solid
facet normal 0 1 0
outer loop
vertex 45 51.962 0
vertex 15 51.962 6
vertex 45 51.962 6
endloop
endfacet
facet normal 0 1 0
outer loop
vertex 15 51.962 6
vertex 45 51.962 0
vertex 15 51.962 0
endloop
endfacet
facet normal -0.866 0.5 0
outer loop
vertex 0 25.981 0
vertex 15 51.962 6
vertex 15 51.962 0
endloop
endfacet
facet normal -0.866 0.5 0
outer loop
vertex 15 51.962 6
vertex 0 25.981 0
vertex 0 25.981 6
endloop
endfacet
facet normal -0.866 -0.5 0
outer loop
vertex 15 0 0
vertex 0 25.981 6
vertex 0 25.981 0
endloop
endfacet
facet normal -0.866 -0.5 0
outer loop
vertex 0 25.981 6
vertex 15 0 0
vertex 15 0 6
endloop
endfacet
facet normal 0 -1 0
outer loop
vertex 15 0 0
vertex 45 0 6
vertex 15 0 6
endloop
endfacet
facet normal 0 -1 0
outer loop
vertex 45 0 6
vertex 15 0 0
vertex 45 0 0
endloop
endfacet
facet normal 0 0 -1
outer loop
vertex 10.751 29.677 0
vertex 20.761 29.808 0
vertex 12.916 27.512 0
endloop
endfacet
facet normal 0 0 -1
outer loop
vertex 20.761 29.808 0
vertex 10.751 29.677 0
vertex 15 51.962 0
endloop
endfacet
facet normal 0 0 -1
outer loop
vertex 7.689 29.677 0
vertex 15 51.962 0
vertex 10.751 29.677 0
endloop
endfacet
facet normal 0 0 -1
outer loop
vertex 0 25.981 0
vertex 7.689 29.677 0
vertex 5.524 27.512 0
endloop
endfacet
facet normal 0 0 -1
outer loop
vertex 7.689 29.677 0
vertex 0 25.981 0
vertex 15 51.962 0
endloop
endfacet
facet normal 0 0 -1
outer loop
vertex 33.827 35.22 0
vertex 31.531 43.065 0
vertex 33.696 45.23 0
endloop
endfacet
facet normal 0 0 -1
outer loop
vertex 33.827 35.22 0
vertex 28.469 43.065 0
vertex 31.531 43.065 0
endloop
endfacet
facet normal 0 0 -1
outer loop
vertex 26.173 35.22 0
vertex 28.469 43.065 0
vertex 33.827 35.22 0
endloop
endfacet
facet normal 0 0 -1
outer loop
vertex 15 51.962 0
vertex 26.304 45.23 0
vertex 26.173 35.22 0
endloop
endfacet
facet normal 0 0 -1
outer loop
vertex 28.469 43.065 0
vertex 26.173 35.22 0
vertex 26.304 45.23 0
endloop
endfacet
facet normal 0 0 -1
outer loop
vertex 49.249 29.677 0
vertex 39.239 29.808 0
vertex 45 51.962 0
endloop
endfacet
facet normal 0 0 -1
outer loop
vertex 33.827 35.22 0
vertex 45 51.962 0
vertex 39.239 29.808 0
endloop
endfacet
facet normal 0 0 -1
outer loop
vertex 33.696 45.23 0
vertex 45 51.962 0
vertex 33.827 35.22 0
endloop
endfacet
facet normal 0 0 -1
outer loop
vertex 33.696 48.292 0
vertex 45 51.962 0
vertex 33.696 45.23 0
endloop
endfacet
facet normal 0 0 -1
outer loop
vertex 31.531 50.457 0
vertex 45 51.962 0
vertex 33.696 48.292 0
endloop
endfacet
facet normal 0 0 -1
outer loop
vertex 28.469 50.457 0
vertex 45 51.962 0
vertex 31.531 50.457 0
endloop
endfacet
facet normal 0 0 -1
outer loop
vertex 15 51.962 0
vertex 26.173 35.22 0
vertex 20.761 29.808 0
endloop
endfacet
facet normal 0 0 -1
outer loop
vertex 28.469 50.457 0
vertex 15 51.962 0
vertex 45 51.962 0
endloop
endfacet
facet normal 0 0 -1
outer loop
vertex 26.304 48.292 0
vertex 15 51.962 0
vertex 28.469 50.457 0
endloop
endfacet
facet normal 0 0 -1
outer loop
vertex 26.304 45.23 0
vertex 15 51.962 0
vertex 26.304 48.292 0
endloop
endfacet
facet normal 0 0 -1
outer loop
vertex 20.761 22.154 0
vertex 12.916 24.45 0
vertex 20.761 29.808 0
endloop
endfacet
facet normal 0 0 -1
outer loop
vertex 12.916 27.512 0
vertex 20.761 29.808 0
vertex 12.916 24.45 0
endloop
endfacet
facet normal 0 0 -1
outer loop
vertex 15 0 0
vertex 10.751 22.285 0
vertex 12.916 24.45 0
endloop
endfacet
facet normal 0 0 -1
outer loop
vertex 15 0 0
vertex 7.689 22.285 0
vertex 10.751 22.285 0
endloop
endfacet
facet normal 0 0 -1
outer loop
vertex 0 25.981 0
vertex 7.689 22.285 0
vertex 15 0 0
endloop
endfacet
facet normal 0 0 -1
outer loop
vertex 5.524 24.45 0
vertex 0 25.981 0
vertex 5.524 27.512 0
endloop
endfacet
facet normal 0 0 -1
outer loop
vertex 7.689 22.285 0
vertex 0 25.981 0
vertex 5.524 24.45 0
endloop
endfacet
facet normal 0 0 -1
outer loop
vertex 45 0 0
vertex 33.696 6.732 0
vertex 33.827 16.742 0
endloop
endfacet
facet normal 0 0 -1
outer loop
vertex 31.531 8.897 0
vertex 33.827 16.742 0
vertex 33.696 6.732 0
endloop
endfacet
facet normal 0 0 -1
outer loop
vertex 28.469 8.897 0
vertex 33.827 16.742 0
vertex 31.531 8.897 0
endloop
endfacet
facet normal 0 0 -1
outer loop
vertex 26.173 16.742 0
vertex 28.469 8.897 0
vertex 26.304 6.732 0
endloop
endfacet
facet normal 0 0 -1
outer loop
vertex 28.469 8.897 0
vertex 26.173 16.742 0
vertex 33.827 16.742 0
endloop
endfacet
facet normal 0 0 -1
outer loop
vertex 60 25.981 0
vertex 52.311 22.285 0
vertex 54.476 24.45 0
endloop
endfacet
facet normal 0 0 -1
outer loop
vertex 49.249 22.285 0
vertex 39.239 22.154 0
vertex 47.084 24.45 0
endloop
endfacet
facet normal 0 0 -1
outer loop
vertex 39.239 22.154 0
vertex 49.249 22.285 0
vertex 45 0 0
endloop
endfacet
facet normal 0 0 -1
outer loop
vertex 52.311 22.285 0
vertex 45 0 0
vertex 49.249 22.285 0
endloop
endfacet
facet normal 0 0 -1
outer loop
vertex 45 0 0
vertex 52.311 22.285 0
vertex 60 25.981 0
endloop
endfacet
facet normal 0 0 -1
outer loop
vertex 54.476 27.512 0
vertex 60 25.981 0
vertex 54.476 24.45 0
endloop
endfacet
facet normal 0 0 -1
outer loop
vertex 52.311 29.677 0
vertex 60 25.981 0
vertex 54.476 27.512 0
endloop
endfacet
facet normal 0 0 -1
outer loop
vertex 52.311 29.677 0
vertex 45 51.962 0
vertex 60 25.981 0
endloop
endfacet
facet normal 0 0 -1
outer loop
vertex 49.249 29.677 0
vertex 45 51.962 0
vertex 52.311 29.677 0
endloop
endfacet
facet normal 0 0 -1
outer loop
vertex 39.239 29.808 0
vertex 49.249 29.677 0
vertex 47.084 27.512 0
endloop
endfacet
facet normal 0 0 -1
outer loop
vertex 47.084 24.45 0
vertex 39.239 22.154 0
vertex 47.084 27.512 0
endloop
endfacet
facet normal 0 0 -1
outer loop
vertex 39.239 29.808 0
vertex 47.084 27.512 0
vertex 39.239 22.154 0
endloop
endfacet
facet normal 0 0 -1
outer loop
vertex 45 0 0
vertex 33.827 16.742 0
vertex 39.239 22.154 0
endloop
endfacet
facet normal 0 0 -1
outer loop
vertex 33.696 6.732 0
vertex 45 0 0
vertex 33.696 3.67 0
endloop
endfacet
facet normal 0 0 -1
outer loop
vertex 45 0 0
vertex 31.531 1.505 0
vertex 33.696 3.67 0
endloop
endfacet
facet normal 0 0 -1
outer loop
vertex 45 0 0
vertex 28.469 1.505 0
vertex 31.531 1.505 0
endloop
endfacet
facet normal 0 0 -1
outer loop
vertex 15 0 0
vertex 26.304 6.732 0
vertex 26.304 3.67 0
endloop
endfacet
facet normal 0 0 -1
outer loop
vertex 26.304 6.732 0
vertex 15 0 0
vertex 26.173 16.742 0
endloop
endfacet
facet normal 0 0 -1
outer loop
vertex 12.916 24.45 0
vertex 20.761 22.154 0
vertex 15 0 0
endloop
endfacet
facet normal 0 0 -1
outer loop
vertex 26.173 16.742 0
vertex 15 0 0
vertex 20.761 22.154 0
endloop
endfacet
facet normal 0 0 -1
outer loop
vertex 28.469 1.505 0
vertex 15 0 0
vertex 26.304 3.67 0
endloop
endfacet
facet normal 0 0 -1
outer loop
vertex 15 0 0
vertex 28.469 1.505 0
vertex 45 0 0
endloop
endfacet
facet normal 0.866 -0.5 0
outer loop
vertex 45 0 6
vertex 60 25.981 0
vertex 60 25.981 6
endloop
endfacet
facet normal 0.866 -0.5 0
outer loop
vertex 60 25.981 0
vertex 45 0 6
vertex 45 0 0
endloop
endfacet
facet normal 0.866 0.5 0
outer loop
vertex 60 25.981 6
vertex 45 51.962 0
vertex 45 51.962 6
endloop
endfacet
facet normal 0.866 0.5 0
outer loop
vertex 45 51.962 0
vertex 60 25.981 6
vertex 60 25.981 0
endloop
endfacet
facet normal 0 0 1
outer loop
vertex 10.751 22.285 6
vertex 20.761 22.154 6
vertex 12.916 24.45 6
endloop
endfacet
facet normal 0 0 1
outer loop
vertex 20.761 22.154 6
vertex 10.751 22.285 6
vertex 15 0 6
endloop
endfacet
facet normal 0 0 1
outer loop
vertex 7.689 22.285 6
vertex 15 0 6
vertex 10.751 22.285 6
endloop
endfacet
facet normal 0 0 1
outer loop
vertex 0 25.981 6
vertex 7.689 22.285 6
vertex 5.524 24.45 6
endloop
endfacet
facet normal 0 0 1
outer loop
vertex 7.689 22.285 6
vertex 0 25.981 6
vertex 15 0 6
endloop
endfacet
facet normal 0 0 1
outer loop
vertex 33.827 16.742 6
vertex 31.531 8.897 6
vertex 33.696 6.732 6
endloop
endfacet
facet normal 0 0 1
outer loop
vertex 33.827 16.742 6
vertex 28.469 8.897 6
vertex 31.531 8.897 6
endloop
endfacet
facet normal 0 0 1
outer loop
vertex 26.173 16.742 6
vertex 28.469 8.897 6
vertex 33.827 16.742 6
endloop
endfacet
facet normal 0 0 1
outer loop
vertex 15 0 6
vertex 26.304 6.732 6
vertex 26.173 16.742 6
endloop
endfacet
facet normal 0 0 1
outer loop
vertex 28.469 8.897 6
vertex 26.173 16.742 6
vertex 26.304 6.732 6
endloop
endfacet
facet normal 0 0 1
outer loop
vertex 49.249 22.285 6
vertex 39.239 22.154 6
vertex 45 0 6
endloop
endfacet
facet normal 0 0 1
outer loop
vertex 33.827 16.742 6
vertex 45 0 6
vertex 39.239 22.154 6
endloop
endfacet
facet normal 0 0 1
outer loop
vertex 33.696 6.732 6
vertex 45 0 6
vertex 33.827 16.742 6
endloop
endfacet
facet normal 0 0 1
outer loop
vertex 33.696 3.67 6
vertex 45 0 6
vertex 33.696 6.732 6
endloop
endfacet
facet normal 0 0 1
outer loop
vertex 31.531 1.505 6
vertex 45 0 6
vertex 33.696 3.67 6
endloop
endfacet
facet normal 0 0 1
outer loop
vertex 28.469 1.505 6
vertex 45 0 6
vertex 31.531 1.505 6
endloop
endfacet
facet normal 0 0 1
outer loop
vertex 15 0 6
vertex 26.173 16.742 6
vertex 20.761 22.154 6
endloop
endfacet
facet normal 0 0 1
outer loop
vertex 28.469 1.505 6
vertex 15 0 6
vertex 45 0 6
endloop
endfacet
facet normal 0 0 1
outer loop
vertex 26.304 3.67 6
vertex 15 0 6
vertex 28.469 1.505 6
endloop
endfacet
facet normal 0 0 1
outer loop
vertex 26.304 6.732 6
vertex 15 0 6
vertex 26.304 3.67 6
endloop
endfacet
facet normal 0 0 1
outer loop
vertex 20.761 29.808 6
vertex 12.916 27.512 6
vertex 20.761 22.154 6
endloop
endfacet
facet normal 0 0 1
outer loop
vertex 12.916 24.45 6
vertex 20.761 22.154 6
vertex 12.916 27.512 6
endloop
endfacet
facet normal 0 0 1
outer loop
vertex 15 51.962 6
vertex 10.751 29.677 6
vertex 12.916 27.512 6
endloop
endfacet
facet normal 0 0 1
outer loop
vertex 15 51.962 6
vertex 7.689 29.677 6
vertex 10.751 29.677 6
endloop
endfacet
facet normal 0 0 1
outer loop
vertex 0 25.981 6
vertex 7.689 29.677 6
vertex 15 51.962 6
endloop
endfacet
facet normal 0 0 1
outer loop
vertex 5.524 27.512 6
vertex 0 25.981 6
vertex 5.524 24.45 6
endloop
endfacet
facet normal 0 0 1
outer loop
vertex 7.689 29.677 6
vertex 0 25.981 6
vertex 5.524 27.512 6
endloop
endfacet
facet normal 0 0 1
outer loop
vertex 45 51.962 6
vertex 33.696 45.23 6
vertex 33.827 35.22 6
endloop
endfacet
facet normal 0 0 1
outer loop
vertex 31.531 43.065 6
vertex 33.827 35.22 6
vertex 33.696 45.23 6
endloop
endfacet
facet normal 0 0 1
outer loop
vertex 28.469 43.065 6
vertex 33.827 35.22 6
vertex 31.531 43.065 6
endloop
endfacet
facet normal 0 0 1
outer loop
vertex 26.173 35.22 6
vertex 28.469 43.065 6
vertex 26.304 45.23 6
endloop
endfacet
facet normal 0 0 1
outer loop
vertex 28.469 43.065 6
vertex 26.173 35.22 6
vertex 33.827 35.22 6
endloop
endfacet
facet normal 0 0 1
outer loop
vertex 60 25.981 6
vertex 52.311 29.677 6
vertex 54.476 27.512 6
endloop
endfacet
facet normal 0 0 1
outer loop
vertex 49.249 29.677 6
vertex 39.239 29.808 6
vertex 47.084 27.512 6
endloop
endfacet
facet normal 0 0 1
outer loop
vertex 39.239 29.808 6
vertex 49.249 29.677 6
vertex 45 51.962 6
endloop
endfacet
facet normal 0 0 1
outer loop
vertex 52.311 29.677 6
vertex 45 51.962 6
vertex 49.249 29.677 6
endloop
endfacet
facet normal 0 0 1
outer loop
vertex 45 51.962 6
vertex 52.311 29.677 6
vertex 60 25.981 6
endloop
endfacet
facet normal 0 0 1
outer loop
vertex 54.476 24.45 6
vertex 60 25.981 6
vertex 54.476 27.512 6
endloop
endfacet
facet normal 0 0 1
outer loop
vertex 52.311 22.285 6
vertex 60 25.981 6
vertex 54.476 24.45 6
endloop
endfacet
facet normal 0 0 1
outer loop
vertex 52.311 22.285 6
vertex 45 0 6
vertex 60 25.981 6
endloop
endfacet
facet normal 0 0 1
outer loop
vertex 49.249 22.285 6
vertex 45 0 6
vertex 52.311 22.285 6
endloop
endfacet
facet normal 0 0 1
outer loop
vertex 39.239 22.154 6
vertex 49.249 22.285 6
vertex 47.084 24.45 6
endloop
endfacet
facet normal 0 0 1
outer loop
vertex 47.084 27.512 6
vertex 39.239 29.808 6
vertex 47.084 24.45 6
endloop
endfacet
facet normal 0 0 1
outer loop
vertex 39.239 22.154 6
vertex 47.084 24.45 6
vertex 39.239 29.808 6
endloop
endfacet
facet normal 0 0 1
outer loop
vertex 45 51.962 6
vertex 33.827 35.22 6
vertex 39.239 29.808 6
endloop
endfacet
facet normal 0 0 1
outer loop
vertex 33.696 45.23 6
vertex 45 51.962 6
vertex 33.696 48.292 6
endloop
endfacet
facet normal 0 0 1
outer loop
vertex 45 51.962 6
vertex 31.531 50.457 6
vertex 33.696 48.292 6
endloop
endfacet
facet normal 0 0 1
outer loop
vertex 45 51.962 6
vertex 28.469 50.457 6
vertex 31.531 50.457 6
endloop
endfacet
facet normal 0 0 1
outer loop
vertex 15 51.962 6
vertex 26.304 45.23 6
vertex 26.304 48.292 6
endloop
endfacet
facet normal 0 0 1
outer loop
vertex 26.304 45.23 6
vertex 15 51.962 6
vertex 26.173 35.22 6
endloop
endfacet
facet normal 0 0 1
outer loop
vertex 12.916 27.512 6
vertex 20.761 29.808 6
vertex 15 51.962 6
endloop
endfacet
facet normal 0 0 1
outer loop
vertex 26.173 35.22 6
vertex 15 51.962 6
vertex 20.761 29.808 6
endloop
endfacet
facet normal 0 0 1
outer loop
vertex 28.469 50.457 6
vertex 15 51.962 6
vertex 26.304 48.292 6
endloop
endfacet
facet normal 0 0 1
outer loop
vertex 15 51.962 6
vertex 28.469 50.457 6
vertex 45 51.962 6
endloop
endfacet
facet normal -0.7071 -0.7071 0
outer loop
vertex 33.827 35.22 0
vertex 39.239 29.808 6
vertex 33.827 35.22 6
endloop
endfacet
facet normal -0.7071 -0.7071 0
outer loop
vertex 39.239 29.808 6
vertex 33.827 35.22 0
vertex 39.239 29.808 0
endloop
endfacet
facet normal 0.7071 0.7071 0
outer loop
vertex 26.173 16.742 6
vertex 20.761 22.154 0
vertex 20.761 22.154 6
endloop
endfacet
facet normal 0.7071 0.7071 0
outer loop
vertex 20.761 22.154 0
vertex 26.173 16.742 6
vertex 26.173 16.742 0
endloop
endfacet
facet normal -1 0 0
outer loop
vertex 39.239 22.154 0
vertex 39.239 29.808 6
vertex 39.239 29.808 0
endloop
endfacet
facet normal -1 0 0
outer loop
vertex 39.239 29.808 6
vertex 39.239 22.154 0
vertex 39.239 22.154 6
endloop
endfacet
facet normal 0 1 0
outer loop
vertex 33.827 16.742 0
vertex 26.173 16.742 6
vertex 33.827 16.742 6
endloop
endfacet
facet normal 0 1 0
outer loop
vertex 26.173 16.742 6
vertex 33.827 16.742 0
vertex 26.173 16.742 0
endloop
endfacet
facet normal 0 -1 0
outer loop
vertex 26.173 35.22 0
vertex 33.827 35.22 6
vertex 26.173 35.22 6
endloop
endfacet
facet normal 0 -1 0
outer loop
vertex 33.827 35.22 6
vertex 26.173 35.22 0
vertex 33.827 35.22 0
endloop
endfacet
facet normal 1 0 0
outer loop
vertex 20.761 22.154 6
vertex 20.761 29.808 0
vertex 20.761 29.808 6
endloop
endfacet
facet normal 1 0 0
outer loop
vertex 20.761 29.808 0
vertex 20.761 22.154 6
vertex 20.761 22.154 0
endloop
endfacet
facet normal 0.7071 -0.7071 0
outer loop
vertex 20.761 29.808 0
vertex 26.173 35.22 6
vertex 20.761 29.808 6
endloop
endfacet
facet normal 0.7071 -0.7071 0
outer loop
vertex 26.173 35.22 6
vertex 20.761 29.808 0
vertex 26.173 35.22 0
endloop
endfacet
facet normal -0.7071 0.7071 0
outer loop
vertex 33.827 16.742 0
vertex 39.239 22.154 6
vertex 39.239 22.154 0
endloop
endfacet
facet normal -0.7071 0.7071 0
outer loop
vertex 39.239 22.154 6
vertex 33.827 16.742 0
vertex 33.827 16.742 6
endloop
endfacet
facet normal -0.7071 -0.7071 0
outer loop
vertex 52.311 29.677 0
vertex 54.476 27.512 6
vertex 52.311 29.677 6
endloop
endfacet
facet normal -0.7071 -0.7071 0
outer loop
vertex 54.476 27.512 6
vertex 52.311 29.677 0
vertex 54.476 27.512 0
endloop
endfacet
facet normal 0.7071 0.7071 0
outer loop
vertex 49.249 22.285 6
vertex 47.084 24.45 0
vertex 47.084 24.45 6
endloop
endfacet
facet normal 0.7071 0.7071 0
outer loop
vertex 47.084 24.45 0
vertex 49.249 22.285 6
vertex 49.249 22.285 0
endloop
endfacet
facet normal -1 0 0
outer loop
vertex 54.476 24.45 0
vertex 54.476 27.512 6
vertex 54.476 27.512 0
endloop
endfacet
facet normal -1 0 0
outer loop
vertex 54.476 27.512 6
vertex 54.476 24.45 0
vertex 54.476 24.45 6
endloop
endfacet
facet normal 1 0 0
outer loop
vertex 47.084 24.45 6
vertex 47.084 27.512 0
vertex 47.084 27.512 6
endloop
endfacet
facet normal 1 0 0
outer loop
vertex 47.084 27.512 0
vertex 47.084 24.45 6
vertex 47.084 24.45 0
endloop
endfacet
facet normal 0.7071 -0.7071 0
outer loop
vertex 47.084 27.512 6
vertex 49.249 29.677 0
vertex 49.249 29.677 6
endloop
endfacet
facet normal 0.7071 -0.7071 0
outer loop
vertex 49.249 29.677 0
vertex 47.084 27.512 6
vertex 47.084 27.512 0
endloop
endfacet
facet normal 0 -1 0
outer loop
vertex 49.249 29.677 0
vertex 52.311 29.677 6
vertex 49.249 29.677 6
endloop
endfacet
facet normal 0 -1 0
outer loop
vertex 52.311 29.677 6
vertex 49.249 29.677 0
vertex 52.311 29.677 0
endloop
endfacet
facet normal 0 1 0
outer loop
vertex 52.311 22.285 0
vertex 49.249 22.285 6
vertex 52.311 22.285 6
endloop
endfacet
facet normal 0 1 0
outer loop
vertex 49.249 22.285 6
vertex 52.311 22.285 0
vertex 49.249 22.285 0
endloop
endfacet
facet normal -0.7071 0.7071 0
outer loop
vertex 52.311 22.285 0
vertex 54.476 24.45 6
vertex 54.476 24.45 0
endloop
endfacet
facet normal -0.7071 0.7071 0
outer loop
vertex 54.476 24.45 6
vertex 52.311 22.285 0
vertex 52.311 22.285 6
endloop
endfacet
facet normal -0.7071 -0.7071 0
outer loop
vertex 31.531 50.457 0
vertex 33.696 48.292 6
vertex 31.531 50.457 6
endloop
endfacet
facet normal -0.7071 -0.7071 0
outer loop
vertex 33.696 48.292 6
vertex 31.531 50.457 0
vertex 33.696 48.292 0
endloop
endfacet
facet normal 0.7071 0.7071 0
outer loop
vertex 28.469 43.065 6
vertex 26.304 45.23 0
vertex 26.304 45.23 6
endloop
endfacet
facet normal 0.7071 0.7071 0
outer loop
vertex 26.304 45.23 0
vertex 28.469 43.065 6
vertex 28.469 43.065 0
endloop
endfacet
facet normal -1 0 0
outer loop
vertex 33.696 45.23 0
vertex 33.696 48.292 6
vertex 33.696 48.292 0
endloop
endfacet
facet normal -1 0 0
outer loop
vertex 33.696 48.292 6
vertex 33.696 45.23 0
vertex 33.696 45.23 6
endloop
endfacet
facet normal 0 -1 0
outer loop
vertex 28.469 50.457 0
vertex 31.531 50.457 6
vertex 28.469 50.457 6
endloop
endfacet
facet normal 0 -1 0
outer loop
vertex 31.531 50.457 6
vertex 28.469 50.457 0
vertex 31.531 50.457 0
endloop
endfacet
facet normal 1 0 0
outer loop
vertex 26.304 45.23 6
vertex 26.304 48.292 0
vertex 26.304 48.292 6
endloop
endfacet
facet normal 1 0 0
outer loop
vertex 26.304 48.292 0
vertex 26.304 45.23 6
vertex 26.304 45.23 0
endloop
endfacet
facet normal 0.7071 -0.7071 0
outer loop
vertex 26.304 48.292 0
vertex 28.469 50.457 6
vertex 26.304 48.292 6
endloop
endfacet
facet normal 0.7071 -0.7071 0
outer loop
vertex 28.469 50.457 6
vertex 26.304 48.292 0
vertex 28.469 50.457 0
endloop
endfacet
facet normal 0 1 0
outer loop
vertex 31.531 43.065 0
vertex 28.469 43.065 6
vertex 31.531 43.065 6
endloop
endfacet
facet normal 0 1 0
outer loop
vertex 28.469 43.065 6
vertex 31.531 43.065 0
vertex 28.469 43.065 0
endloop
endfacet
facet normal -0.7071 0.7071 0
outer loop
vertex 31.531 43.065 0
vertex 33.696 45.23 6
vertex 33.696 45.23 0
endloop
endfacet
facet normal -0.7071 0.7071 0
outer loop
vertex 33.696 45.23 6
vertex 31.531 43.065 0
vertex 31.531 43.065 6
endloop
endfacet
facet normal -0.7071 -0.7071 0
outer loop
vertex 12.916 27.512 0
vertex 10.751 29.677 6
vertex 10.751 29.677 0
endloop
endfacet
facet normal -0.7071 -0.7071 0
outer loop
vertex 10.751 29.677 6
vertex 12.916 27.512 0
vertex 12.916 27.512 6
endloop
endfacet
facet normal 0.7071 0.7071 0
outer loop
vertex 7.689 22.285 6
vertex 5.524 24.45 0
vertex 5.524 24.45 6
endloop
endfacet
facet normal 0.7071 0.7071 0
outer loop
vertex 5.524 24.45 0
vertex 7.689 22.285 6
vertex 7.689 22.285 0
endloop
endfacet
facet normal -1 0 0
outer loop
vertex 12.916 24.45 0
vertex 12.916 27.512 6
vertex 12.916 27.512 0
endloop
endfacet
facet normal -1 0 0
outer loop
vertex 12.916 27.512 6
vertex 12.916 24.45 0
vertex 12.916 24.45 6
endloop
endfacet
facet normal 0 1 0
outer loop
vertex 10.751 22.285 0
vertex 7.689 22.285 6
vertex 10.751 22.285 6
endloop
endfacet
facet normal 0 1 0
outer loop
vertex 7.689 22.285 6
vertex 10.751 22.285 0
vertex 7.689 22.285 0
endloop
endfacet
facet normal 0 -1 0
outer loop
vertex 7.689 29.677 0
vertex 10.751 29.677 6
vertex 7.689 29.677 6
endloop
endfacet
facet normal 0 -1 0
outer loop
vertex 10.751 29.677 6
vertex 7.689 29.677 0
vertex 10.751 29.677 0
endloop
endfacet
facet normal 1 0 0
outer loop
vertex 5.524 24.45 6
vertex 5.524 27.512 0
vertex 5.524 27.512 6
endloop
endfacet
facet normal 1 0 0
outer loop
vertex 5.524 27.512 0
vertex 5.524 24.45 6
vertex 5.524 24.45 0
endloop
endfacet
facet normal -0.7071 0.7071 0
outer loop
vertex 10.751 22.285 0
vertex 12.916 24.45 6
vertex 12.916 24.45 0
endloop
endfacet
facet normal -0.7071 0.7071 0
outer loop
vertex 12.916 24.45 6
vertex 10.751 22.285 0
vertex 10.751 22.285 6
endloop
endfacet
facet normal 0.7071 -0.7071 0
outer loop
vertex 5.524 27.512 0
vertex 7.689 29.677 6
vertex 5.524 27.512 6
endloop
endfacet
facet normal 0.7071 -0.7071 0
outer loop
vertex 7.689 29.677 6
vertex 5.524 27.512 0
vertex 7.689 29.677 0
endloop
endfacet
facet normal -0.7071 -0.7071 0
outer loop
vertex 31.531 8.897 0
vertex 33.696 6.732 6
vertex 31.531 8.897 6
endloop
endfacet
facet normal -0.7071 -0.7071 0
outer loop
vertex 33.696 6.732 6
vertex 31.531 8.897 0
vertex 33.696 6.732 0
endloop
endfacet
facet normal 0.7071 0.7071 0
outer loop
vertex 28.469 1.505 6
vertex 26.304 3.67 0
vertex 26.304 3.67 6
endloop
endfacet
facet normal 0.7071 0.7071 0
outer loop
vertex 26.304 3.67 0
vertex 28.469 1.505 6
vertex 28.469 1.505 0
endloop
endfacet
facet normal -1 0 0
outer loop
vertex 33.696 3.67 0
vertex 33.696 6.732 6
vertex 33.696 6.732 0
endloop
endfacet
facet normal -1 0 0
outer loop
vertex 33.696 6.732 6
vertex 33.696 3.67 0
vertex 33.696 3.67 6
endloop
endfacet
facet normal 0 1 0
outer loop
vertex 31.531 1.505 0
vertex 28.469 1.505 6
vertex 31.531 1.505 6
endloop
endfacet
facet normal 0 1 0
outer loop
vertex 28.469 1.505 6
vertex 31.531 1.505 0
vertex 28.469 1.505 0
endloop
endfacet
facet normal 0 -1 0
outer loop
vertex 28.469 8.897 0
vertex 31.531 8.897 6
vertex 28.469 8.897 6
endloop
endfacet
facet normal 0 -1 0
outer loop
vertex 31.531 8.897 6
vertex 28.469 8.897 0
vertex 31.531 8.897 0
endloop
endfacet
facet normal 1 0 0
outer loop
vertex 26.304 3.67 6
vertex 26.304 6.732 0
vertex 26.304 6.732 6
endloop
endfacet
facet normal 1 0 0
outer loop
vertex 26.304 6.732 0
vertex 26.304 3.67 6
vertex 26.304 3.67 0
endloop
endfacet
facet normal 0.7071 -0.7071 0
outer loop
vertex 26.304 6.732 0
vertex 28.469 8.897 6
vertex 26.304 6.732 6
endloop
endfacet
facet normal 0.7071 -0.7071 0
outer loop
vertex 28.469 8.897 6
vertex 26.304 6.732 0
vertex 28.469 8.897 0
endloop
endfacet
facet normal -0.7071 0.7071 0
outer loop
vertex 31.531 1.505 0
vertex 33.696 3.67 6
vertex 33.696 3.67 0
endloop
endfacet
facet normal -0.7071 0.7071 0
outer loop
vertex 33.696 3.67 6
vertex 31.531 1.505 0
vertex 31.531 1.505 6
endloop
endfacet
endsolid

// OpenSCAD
$fn = 32;

// ----------------------------------------------------------------------
// Polygon plate: 6-gon R30, 4 bolt windows
// ----------------------------------------------------------------------

// --- parameters (mm) ---
sides = 6;                // number of polygon sides
plate_r = 30;             // circumscribed radius of the polygon
bore_r = 10;              // centre bore radius
bolts = 4;                // number of bolt windows
ring_r = 20.78;           // bolt-circle radius
bolt_r = 4;               // bolt window radius
plate_t = 6;              // plate thickness, Z (extrusion height)

plate_d = 2 * plate_r;  // circumscribed diameter
bore_d = 2 * bore_r;  // centre bore diameter
bolt_d = 2 * bolt_r;  // bolt window diameter
ring_d = 2 * ring_r;  // bolt-circle diameter

profile = [[60, 25.981], [45, 51.962], [15, 51.962], [0, 25.981], [15, 0], [45, 0]];  // primary outline, 6 points, counter clockwise
void_1 = [[39.239, 29.808], [33.827, 35.22], [26.173, 35.22], [20.761, 29.808], [20.761, 22.154], [26.173, 16.742], [33.827, 16.742], [39.239, 22.154]];  // centre bore, 8 points
void_2 = [[54.476, 27.512], [52.311, 29.677], [49.249, 29.677], [47.084, 27.512], [47.084, 24.45], [49.249, 22.285], [52.311, 22.285], [54.476, 24.45]];  // bolt window 1, 8 points
void_3 = [[33.696, 48.292], [31.531, 50.457], [28.469, 50.457], [26.304, 48.292], [26.304, 45.23], [28.469, 43.065], [31.531, 43.065], [33.696, 45.23]];  // bolt window 2, 8 points
void_4 = [[12.916, 27.512], [10.751, 29.677], [7.689, 29.677], [5.524, 27.512], [5.524, 24.45], [7.689, 22.285], [10.751, 22.285], [12.916, 24.45]];  // bolt window 3, 8 points
void_5 = [[33.696, 6.732], [31.531, 8.897], [28.469, 8.897], [26.304, 6.732], [26.304, 3.67], [28.469, 1.505], [31.531, 1.505], [33.696, 3.67]];  // bolt window 4, 8 points

// --- the one profile operation ---
difference() {
  linear_extrude(height = plate_t) polygon(points = profile);
  translate([0, 0, -1])
    linear_extrude(height = plate_t + 2) polygon(points = void_1);
  translate([0, 0, -1])
    linear_extrude(height = plate_t + 2) polygon(points = void_2);
  translate([0, 0, -1])
    linear_extrude(height = plate_t + 2) polygon(points = void_3);
  translate([0, 0, -1])
    linear_extrude(height = plate_t + 2) polygon(points = void_4);
  translate([0, 0, -1])
    linear_extrude(height = plate_t + 2) polygon(points = void_5);
}
